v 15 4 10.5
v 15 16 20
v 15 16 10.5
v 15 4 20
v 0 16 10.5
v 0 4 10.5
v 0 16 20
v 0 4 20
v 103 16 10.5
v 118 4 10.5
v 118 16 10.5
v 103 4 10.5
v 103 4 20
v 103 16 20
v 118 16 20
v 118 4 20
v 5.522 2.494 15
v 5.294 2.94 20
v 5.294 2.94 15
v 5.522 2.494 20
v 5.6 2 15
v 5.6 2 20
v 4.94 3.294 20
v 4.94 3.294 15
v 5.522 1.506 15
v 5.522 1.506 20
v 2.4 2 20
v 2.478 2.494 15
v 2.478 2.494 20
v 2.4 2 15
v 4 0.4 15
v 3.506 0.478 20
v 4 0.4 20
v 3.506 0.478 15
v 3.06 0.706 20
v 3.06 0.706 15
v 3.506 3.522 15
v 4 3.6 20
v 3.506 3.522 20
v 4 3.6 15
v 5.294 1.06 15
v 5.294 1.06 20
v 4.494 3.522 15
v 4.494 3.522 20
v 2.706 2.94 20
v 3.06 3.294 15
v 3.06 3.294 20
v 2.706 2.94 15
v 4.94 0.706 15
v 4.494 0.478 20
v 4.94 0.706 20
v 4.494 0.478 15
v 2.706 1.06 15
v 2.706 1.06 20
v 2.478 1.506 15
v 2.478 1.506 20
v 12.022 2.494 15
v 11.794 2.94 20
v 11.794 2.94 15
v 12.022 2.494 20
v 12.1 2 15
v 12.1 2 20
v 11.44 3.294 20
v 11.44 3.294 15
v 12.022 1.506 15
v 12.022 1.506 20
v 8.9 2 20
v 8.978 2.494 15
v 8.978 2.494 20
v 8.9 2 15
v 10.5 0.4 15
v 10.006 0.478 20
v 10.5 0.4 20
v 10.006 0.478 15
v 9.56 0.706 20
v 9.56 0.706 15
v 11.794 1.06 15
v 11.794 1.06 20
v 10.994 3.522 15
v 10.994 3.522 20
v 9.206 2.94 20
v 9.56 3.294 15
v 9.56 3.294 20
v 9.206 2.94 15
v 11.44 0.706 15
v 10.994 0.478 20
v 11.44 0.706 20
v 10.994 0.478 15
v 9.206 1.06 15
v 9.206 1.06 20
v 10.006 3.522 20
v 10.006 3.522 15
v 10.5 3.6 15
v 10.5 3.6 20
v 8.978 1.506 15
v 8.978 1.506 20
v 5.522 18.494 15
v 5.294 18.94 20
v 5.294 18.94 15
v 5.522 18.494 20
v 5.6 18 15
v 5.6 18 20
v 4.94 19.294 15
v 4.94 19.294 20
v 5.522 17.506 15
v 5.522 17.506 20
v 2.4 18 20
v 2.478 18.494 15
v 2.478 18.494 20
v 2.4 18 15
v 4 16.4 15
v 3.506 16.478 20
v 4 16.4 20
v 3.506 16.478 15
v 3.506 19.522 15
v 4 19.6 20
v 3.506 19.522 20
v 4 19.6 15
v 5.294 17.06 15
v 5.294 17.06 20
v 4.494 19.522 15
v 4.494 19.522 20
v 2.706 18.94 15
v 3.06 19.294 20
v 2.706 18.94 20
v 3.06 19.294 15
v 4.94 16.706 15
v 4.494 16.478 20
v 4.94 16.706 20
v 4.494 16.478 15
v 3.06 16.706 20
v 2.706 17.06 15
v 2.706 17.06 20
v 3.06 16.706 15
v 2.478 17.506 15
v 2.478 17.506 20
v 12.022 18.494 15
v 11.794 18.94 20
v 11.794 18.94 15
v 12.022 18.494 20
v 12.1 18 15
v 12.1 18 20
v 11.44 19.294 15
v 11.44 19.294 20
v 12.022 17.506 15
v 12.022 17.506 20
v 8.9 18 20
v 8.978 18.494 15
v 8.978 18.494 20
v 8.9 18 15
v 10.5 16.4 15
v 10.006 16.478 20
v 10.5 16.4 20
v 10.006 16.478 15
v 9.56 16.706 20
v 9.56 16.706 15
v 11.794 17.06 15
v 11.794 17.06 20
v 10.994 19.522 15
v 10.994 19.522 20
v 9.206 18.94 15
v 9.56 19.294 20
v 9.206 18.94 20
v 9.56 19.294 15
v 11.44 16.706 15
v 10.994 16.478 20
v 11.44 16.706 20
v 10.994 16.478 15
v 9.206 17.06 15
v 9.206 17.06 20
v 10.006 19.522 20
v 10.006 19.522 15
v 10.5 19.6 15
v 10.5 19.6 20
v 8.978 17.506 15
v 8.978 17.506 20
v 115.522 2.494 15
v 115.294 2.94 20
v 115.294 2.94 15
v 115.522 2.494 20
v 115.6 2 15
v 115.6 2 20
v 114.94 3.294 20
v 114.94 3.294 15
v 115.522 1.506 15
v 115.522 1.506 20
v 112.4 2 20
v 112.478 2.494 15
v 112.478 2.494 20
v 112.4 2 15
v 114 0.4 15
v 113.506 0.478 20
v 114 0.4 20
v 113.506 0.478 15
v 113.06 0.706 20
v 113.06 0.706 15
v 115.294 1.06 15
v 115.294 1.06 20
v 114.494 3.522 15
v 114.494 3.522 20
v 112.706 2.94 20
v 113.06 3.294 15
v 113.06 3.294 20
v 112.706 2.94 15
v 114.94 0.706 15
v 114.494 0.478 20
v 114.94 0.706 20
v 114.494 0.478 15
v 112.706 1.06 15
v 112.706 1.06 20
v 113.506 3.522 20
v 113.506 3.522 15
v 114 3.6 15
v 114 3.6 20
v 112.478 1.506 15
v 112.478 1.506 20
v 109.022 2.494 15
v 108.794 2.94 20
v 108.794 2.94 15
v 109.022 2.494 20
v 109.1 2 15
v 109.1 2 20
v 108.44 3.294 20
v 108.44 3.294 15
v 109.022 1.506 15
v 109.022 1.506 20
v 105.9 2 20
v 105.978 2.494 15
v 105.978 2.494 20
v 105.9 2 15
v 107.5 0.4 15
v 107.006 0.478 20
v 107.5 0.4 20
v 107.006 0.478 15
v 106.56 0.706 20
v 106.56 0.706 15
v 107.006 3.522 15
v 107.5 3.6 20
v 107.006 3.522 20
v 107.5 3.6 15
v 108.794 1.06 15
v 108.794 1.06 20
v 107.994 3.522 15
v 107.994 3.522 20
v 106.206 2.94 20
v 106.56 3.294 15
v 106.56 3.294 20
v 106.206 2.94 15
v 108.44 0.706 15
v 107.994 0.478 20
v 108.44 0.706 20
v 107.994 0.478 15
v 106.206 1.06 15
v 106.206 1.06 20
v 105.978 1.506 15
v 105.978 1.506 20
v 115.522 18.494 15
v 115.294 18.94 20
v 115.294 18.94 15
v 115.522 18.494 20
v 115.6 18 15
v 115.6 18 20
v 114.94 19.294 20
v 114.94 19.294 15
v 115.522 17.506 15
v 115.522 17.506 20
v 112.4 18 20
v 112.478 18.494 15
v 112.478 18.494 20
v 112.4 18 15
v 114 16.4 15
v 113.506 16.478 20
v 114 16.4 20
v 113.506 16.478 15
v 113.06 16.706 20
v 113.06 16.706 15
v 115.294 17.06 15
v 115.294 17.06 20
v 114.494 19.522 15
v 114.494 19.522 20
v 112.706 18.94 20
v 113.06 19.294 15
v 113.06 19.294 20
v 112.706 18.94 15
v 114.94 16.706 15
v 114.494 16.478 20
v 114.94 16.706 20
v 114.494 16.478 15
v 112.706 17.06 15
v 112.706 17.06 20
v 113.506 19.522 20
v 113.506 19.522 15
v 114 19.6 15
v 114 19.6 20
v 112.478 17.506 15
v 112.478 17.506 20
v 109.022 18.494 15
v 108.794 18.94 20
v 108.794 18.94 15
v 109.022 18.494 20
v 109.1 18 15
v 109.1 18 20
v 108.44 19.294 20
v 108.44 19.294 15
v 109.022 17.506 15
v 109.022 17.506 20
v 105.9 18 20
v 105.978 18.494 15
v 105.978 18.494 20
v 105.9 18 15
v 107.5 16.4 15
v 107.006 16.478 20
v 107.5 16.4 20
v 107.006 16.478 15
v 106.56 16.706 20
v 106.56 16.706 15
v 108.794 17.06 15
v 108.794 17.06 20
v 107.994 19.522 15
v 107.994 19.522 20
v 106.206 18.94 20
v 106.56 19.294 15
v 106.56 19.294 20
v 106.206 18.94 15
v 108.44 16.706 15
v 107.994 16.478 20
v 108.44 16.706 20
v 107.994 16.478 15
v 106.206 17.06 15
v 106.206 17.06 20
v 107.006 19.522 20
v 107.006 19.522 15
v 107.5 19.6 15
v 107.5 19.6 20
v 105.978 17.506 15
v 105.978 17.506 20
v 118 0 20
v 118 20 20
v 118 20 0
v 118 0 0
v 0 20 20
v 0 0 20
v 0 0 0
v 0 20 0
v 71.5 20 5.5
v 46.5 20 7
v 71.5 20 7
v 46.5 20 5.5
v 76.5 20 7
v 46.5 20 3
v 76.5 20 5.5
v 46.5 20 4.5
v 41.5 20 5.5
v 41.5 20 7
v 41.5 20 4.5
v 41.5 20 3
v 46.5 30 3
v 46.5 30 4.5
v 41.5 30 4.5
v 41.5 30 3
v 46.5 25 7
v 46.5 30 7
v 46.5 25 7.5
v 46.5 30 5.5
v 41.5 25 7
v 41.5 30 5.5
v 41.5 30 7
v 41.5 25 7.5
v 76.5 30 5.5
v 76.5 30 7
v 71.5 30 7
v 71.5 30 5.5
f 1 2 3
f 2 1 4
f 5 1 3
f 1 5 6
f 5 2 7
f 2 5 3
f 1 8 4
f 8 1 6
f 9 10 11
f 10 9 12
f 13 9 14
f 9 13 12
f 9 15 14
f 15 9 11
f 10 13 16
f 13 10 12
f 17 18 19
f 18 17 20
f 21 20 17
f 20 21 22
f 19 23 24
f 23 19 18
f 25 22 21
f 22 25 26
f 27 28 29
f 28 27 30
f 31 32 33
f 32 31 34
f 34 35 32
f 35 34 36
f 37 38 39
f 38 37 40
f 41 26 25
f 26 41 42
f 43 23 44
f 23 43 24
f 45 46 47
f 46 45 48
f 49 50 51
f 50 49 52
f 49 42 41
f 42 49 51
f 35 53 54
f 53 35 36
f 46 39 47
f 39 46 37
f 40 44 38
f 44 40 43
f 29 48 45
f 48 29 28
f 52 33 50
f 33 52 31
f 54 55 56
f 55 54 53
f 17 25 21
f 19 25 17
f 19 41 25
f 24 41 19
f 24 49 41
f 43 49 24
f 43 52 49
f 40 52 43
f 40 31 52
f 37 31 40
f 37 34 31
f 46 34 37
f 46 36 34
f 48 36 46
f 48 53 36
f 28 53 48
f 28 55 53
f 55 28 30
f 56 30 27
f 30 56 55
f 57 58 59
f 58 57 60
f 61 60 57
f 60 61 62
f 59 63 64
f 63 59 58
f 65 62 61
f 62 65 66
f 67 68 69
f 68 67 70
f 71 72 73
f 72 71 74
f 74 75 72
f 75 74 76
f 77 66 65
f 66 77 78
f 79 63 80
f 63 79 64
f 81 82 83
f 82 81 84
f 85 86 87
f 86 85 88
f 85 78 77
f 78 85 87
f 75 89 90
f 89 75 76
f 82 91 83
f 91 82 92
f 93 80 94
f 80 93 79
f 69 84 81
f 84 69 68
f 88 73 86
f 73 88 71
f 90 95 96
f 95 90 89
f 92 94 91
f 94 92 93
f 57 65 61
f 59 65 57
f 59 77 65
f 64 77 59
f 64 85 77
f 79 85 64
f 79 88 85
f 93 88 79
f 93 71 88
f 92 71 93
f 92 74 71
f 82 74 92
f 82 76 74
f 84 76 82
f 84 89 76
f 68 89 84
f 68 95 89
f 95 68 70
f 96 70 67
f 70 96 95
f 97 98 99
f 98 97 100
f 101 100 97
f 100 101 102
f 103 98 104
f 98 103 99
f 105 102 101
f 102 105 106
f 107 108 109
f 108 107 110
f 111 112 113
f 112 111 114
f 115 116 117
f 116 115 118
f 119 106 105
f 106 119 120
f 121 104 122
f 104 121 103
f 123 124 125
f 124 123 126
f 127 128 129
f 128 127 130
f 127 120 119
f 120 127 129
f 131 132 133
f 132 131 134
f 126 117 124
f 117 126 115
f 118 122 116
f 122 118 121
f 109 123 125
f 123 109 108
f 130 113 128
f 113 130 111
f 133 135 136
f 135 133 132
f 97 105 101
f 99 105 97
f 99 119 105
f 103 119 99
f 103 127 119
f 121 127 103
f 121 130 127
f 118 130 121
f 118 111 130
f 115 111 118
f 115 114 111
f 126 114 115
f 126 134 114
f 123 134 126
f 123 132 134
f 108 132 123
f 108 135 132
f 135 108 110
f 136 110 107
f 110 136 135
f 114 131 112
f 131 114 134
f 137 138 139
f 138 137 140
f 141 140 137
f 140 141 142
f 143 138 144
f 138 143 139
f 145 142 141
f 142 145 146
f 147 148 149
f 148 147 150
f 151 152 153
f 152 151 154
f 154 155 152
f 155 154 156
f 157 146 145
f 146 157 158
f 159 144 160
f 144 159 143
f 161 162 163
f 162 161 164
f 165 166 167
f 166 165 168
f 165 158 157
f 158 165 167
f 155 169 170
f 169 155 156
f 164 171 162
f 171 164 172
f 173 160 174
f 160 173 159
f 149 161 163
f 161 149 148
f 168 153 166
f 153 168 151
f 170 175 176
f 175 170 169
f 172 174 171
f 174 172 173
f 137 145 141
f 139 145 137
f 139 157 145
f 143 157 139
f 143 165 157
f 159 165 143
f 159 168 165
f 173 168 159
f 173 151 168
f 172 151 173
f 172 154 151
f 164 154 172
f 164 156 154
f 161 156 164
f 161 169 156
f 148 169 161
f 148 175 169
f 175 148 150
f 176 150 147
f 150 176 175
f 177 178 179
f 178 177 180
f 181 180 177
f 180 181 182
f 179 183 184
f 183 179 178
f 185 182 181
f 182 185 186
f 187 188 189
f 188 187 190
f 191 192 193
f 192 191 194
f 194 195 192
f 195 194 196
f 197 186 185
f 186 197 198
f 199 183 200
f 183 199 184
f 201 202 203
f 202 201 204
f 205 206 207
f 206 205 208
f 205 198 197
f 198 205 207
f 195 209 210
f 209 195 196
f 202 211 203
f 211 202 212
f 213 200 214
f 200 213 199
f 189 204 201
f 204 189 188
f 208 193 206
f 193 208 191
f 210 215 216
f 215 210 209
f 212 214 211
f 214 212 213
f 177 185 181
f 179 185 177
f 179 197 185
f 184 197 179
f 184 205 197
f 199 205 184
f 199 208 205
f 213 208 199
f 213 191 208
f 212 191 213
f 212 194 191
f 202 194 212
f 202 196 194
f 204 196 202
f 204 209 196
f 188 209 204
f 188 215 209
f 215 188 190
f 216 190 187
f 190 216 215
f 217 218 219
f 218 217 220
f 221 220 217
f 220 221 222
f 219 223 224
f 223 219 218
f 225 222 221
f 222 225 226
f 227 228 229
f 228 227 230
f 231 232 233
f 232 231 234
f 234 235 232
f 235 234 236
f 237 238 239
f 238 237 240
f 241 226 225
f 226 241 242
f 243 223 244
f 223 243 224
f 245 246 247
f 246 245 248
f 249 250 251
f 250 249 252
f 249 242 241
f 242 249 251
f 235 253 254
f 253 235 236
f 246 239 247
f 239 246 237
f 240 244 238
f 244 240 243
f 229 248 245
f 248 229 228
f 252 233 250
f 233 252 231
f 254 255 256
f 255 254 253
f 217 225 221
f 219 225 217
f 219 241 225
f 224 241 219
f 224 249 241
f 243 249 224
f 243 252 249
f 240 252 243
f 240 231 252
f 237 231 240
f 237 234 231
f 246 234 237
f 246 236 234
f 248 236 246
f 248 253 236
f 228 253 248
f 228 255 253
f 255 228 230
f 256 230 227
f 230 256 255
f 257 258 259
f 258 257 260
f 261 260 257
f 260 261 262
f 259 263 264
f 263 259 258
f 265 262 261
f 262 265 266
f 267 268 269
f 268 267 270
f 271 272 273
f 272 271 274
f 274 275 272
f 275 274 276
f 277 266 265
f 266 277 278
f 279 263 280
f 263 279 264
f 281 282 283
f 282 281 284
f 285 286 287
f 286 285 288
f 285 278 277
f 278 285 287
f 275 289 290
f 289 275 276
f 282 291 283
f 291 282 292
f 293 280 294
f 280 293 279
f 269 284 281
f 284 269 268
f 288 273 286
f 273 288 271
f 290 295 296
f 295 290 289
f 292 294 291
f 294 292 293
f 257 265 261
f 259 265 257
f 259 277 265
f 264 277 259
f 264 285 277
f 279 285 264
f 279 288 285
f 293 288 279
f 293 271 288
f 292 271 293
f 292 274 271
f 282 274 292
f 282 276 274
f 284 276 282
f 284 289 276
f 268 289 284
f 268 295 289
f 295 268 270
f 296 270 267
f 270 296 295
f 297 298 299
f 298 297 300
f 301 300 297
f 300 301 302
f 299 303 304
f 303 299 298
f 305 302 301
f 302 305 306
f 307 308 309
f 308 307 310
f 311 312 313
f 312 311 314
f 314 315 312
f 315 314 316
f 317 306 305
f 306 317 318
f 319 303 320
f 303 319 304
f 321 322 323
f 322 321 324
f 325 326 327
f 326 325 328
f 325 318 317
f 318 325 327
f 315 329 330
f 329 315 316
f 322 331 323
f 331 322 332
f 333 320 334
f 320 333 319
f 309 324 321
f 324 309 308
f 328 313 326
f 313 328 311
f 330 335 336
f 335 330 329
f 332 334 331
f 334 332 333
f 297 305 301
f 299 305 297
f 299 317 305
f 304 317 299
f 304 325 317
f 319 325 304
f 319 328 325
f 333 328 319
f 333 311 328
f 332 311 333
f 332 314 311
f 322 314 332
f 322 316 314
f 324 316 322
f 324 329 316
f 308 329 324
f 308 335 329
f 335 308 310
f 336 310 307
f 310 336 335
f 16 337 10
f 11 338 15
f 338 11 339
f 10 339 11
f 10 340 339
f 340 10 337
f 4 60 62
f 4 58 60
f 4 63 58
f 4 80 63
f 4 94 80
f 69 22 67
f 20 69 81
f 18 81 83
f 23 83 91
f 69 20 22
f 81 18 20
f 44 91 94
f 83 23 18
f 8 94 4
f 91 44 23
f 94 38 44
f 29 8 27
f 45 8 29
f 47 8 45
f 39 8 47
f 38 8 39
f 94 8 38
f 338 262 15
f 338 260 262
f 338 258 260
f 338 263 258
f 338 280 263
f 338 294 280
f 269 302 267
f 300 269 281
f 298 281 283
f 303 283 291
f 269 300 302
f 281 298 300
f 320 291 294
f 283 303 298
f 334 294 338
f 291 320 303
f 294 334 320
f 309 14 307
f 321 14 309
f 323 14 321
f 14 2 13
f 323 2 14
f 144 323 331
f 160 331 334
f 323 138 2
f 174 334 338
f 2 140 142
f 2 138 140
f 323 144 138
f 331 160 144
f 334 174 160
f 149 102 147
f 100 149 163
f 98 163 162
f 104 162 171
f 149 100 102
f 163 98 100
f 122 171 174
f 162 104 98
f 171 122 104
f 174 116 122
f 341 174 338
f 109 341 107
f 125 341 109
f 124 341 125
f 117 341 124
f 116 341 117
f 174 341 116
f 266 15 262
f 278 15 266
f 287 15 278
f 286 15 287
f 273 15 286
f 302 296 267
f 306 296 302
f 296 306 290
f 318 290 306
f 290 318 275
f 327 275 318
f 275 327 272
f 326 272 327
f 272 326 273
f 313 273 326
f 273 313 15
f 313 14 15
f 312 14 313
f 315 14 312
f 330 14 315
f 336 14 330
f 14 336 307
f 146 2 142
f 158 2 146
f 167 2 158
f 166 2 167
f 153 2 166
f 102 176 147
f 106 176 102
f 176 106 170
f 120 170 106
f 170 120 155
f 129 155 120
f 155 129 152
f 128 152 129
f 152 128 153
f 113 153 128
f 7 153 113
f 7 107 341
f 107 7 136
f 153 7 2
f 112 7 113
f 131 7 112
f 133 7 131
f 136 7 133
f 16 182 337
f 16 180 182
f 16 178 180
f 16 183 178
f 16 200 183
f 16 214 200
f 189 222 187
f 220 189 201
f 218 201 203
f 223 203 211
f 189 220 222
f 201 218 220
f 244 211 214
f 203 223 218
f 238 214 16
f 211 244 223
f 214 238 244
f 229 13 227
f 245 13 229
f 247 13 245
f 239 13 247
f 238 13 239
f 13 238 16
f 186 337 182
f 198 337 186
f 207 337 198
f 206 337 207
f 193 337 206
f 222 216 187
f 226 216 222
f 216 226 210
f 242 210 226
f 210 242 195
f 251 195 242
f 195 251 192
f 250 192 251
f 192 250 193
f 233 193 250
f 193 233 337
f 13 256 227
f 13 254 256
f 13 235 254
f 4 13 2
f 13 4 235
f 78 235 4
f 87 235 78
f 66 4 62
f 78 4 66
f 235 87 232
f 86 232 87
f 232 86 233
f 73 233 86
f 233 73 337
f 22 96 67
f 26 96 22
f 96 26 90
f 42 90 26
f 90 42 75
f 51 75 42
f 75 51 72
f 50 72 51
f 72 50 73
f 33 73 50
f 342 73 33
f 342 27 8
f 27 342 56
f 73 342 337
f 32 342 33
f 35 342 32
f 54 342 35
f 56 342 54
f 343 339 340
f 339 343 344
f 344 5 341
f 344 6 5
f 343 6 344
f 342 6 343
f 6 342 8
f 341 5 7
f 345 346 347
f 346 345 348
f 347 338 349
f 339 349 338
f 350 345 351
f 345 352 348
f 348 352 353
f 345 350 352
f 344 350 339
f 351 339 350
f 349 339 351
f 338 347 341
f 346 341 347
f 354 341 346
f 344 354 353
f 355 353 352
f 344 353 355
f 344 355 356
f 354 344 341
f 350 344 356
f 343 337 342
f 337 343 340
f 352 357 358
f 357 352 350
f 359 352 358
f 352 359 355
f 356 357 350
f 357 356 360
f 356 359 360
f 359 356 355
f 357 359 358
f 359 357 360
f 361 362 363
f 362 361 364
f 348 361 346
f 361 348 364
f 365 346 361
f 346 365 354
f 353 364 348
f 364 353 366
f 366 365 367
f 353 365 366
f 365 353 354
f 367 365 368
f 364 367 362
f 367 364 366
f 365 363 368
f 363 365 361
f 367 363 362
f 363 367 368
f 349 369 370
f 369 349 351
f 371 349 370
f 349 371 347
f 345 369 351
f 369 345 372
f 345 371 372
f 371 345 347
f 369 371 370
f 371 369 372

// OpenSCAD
/*
L = 52;
W = 31.5;
H = 15;
halfH = 7;
R = 7.5;
Battery_H = 49;

difference(){
	cube([L,W,H]);
	union(){
		translate([1.5,0.5+R,0.5+R])rotate([0,90,0])cylinder(Battery_H,R,R);
		translate([1.5,-1,halfH])cube([Battery_H,W+2,2*H]);
		translate([1.5,0.5+R+0.5+2*R,0.5+R])rotate([0,90,0])cylinder(Battery_H,R,R);
	}
}
*/

// car_board:


//carback
carback_L = 118;
carback_W = 20;
carback_H = 20;

carback_motor_h = 9.5;
carback_motor_w = 12;
carback_motor_d = 15;

carback_screw_r = 1.6;
carback_screw_h = 10;
carback_screw_d1 = 4;
carback_screw_d2 = 10.5;

difference(){
	cube([carback_L,carback_W,carback_H]);
	union(){
		translate([-1,(carback_W-carback_motor_w)/2,carback_H-carback_motor_h])
			cube([carback_motor_d+1,carback_motor_w,carback_motor_h+1]);
		translate([carback_L-carback_motor_d,(carback_W-carback_motor_w)/2,carback_H-carback_motor_h])
			cube([carback_motor_d+1,carback_motor_w,carback_motor_h+1]);
		
		//screw four
		translate([carback_screw_d1,(carback_W-carback_motor_w)/4,carback_H])
			cylinder(carback_screw_h,carback_screw_r,carback_screw_r,true,$fn=20);
		translate([carback_screw_d2,(carback_W-carback_motor_w)/4,carback_H])
			cylinder(carback_screw_h,carback_screw_r,carback_screw_r,true,$fn=20);
		translate([carback_screw_d1,carback_W-(carback_W-carback_motor_w)/4,carback_H])
			cylinder(carback_screw_h,carback_screw_r,carback_screw_r,true,$fn=20);
		translate([carback_screw_d2,carback_W-(carback_W-carback_motor_w)/4,carback_H])
			cylinder(carback_screw_h,carback_screw_r,carback_screw_r,true,$fn=20);	
		
		//the other four screw:
		translate([carback_L-carback_screw_d1,(carback_W-carback_motor_w)/4,carback_H])
			cylinder(carback_screw_h,carback_screw_r,carback_screw_r,true,$fn=20);
		translate([carback_L-carback_screw_d2,(carback_W-carback_motor_w)/4,carback_H])
			cylinder(carback_screw_h,carback_screw_r,carback_screw_r,true,$fn=20);
		translate([carback_L-carback_screw_d1,carback_W-(carback_W-carback_motor_w)/4,carback_H])
			cylinder(carback_screw_h,carback_screw_r,carback_screw_r,true,$fn=20);
		translate([carback_L-carback_screw_d2,carback_W-(carback_W-carback_motor_w)/4,carback_H])
			cylinder(carback_screw_h,carback_screw_r,carback_screw_r,true,$fn=20);
	}
	
}

carback_lock_s = 15;
carback_lock_w = 5;
carback_lock_h = 1.5;
carback_lock_d = 10;
carback_lock_vs = 1;
carback_connection_h = 10;

carback_lockcore_d = 5;
carback_lockcore_h = 0.5;

translate([carback_L/2-carback_lock_s-carback_lock_w/2,carback_W,carback_connection_h/2-carback_lock_vs/2-carback_lock_h])
	cube([carback_lock_w,carback_lock_d,carback_lock_h]);
translate([carback_L/2-carback_lock_s-carback_lock_w/2,carback_W,carback_connection_h/2+carback_lock_vs/2])
	cube([carback_lock_w,carback_lock_d,carback_lock_h]);

polyhedron(
	   points=[ [carback_L/2-carback_lock_s+carback_lock_w/2,carback_W+carback_lock_d,carback_connection_h/2+carback_lock_vs/2+carback_lock_h],
				[carback_L/2-carback_lock_s-carback_lock_w/2,carback_W+carback_lock_d,carback_connection_h/2+carback_lock_vs/2+carback_lock_h], 
				[carback_L/2-carback_lock_s-carback_lock_w/2,carback_W+carback_lock_d-carback_lockcore_d,carback_connection_h/2+carback_lock_vs/2+carback_lock_h], 
				[carback_L/2-carback_lock_s+carback_lock_w/2,carback_W+carback_lock_d-carback_lockcore_d,carback_connection_h/2+carback_lock_vs/2+carback_lock_h], 
				[carback_L/2-carback_lock_s+carback_lock_w/2,carback_W+carback_lock_d-carback_lockcore_d,carback_connection_h/2+carback_lock_vs/2+carback_lock_h+carback_lockcore_h], 
				[carback_L/2-carback_lock_s-carback_lock_w/2,carback_W+carback_lock_d-carback_lockcore_d,carback_connection_h/2+carback_lock_vs/2+carback_lock_h+carback_lockcore_h]],
	   faces=[[0,1,2,3],[5,4,3,2],[0,4,5,1],[0,3,4],[5,2,1]]
	   )


translate([carback_L/2+carback_lock_s-carback_lock_w/2,carback_W,carback_connection_h/2-carback_lock_vs/2-carback_lock_h])
	cube([carback_lock_w,carback_lock_d,carback_lock_h]);
translate([carback_L/2+carback_lock_s-carback_lock_w/2,carback_W,carback_connection_h/2+carback_lock_vs/2])
	cube([carback_lock_w,carback_lock_d,carback_lock_h]);
